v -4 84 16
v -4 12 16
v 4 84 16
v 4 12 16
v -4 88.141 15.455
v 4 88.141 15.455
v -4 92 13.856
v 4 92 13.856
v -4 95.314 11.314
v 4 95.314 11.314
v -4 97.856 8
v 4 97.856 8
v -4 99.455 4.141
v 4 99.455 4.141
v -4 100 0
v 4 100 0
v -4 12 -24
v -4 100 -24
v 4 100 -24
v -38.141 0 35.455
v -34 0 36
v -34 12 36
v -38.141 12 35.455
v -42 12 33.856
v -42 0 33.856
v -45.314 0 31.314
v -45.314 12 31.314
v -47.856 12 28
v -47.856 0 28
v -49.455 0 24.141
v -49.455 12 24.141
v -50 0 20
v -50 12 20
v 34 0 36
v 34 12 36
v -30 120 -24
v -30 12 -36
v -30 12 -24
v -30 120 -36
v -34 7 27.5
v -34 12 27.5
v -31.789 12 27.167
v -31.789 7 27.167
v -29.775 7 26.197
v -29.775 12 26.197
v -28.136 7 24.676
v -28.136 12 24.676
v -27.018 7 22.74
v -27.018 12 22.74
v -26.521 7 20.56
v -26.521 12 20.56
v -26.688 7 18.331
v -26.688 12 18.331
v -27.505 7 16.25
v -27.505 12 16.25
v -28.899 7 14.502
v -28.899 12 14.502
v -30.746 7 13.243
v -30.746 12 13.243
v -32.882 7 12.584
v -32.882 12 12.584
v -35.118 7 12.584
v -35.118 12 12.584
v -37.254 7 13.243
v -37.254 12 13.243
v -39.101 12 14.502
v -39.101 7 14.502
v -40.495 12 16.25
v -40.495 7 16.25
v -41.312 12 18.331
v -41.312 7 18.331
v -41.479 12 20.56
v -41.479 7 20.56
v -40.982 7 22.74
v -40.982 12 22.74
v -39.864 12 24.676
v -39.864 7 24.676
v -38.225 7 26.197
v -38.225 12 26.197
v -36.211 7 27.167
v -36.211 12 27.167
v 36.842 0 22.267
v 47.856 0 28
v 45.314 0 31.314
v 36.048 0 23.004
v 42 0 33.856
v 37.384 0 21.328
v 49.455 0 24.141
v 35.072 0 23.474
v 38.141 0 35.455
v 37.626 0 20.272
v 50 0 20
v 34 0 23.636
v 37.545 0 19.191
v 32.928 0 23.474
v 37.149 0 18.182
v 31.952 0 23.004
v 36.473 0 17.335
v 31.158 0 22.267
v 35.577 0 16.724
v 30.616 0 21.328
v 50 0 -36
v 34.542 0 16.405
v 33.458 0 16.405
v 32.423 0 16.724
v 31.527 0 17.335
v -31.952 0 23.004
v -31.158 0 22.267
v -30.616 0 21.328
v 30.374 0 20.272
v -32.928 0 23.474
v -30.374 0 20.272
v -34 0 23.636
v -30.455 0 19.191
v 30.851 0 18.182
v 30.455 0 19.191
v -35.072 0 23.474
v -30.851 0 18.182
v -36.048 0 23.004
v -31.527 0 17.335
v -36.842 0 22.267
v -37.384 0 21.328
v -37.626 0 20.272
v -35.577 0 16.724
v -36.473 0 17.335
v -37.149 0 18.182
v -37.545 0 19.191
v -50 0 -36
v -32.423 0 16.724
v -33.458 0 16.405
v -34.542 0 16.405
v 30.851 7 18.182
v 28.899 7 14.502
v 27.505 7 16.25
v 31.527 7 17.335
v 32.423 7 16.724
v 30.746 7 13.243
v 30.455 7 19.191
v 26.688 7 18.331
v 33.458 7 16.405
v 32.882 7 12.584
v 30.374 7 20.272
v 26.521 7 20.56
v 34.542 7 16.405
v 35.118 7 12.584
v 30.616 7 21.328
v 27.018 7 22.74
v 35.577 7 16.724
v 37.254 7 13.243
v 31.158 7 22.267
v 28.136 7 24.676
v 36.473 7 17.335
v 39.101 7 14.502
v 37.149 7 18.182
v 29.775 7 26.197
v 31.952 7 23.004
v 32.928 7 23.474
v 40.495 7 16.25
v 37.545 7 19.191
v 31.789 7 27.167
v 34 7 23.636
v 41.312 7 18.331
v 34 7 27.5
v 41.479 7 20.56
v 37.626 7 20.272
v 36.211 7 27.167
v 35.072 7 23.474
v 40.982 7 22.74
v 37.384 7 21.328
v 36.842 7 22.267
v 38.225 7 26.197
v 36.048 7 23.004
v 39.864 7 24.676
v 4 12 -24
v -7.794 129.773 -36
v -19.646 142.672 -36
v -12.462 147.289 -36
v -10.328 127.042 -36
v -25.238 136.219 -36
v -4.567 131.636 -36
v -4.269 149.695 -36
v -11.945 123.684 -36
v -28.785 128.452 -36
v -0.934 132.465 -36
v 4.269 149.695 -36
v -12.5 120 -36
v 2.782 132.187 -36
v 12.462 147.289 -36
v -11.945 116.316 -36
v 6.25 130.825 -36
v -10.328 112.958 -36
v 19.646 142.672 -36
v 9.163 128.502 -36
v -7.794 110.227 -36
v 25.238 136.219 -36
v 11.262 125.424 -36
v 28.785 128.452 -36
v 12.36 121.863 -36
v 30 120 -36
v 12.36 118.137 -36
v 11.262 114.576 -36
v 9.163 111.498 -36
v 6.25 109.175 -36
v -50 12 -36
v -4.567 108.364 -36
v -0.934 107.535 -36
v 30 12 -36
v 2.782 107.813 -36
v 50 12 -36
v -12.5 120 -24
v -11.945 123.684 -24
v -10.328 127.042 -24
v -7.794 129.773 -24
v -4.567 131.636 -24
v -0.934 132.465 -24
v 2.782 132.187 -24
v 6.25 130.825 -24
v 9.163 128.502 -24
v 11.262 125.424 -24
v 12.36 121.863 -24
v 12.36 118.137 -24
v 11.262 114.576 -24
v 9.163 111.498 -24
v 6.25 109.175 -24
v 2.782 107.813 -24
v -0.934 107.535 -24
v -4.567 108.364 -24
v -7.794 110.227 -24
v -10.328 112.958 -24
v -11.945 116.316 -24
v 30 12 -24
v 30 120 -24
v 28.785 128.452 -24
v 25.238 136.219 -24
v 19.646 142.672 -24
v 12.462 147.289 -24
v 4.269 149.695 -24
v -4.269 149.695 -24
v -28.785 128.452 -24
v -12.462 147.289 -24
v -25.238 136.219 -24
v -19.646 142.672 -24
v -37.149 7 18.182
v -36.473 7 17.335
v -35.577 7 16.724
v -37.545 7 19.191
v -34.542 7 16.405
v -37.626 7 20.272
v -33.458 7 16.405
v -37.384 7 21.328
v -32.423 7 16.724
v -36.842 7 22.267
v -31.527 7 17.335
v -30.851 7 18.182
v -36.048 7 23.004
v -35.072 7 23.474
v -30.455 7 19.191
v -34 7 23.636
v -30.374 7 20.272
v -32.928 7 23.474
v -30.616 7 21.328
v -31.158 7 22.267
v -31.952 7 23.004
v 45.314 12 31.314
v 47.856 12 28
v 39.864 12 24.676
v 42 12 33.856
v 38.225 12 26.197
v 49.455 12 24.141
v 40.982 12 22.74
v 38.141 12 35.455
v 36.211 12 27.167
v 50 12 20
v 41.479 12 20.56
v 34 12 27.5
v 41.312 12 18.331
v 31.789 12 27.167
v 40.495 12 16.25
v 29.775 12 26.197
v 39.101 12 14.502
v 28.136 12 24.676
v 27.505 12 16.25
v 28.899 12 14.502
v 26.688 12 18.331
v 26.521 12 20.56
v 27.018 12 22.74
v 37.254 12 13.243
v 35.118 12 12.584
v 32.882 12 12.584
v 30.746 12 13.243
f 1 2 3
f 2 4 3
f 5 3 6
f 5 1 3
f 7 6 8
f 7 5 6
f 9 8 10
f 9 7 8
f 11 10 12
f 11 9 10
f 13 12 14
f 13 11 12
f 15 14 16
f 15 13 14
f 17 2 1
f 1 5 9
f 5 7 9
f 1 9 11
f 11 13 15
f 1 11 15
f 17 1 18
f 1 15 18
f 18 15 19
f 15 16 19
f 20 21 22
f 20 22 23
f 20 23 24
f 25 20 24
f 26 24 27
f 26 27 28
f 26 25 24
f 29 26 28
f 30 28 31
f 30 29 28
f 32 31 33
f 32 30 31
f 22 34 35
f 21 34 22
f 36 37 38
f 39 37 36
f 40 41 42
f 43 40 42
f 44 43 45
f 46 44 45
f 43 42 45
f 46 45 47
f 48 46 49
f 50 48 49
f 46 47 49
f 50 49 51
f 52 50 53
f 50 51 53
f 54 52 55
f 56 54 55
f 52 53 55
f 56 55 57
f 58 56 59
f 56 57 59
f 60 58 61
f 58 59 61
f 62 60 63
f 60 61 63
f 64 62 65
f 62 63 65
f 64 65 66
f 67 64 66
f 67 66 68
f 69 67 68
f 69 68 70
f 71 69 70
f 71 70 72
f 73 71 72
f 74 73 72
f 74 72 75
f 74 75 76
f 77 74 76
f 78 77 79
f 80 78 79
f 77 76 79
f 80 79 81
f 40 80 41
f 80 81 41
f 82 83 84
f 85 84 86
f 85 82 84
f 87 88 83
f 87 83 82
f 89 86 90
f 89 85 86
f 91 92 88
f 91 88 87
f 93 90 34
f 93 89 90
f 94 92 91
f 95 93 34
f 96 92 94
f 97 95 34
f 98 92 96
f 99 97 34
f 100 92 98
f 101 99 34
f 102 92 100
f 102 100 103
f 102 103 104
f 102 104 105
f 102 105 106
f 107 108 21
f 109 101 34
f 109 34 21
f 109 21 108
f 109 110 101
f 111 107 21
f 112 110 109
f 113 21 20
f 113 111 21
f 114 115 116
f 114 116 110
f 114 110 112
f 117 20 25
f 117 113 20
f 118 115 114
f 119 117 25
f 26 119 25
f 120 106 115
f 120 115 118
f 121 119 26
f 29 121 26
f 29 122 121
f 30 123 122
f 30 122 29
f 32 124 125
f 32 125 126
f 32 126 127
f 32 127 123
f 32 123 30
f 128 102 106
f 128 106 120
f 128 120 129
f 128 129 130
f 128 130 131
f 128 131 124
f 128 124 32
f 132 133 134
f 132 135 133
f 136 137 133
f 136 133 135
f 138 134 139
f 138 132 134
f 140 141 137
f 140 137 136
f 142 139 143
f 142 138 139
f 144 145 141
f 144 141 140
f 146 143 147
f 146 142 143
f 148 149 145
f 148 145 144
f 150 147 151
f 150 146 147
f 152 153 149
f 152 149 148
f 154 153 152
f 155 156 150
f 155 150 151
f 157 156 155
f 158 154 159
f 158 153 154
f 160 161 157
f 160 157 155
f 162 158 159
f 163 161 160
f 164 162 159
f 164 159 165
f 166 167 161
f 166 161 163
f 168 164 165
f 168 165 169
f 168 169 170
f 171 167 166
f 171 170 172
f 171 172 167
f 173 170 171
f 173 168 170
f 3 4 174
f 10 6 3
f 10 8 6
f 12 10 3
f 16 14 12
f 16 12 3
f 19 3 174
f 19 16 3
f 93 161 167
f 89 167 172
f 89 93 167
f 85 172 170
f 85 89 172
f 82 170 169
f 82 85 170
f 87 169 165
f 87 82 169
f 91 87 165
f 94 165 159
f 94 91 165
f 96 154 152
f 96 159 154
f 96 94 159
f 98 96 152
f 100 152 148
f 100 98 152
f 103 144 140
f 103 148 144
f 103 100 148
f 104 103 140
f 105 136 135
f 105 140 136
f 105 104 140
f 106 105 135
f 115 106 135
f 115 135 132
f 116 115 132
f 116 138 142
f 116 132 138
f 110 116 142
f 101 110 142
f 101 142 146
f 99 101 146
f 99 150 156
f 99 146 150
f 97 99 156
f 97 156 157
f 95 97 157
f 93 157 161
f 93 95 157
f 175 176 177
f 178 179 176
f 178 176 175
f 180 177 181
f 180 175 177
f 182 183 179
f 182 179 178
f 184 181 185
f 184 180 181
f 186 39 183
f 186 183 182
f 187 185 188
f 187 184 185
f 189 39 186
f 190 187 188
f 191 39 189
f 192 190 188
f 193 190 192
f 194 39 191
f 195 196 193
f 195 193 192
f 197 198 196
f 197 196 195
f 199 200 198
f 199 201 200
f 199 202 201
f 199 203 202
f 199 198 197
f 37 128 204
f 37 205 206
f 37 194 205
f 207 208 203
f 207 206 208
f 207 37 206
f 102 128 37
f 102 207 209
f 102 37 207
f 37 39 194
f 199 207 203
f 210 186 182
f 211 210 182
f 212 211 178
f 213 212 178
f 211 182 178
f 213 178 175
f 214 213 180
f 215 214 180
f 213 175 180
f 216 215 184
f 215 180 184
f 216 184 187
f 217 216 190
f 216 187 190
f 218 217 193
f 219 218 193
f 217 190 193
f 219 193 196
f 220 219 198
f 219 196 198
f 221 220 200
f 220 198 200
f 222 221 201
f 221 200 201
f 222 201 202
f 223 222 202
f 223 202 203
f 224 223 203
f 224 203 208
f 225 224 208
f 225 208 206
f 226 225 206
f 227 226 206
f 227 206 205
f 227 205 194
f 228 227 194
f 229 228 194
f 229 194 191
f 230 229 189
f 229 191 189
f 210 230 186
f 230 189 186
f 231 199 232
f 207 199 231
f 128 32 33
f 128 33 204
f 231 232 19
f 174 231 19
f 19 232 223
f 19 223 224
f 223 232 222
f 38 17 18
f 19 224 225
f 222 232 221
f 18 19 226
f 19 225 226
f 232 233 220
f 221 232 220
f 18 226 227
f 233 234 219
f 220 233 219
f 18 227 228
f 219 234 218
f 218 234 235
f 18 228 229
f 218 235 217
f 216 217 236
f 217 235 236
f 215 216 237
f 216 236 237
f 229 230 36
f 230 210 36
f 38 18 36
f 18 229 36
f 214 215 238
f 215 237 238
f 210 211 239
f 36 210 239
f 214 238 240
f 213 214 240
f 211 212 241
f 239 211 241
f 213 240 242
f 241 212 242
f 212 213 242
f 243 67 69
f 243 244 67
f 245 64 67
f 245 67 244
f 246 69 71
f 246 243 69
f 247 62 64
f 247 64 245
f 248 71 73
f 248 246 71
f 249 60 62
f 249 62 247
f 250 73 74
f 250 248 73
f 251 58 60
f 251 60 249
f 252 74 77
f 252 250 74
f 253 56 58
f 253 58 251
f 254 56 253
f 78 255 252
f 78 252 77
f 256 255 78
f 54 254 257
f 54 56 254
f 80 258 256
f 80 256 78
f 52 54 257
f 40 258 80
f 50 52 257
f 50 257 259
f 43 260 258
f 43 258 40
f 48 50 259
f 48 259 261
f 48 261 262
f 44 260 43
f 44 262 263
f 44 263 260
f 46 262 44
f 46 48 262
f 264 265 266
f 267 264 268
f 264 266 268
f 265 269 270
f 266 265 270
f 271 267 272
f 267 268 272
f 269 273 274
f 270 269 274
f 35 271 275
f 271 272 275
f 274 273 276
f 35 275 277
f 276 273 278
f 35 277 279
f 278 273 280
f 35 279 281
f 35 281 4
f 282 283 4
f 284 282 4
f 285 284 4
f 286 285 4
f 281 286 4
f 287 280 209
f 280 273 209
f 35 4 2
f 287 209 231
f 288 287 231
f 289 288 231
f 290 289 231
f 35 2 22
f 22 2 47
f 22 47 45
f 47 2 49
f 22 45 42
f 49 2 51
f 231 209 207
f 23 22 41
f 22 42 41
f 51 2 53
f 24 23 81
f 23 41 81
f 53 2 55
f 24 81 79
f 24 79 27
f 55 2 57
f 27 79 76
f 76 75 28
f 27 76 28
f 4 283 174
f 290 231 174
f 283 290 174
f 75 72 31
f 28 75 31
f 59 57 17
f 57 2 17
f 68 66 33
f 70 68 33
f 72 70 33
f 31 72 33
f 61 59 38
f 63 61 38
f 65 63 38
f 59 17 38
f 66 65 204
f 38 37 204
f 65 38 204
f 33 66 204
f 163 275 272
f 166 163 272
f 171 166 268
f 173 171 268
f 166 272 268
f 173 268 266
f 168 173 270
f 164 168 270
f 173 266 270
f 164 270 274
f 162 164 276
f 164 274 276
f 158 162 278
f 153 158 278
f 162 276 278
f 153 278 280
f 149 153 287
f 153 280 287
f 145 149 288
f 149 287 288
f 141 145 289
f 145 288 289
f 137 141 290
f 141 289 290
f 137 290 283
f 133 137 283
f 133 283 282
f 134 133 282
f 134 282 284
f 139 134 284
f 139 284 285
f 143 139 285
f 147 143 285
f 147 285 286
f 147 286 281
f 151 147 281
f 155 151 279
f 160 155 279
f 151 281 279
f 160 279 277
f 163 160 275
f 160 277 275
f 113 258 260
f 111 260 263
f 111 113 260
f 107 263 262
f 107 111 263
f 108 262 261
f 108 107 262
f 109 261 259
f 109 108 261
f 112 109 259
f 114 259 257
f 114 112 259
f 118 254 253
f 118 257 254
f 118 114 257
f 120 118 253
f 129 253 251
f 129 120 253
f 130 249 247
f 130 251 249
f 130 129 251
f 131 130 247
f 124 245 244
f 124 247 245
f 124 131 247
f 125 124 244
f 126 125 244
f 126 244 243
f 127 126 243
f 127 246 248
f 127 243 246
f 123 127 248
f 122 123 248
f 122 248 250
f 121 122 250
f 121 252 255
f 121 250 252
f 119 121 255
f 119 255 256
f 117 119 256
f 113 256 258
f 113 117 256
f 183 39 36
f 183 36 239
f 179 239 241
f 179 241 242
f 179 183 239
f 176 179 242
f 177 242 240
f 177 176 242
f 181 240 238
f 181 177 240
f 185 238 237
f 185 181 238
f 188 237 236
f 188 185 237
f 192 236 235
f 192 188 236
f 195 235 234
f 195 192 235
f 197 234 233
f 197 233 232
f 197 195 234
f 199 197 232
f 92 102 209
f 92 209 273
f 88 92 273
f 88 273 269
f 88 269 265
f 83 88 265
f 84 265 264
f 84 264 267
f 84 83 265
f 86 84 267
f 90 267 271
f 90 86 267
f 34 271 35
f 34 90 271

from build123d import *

# Parameters (mm, degrees)
EXTRUDE_1_DEPTH     = 12
SKETCH_1_3_R        = 3.63567385
CUT_EXTRUDE_1_DEPTH = 12
SKETCH_2_R          = 7.5
CUT_EXTRUDE_2_DEPTH = 5
SKETCH_4_R          = 12.5
EXTRUDE_2_DEPTH     = 12
SKETCH_5_W          = 40
SKETCH_5_H          = 88
EXTRUDE_3_DEPTH     = 4
FILLET_1_R          = 16


with BuildPart() as part:
    # 草图1 → 凸台-拉伸1 (new body)
    with BuildSketch(Plane(origin=(0, 0, 0), x_dir=(1, 0, 0), z_dir=(0, 1, 0))):
        with BuildLine():
            Line((-50, 36), (50, 36))
            Line((50, 36), (50, -20))
            ThreePointArc((50, -20), (45.313708499, -31.313708499), (34, -36))
            Line((34, -36), (-34, -36))
            ThreePointArc((-34, -36), (-45.313708499, -31.313708499), (-50, -20))
            Line((-50, -20), (-50, 36))
        make_face()
    extrude(amount=EXTRUDE_1_DEPTH)

    # 草图1<3> → 切除-拉伸1 (cut)
    with BuildSketch(Plane(origin=(0, 0, 0), x_dir=(1, 0, 0), z_dir=(0, 1, 0))):
        with Locations((-34, -20)):
            Circle(SKETCH_1_3_R)
        with Locations((34, -20)):
            Circle(SKETCH_1_3_R)
    extrude(amount=CUT_EXTRUDE_1_DEPTH, mode=Mode.SUBTRACT)

    # 草图2 → 切除-拉伸2 (cut)
    with BuildSketch(Plane(origin=(0, 12, 0), x_dir=(1, 0, 0), z_dir=(0, 1, 0))):
        with Locations((34, -20)):
            Circle(SKETCH_2_R)
        with Locations((-34, -20)):
            Circle(SKETCH_2_R)
    extrude(amount=-CUT_EXTRUDE_2_DEPTH, mode=Mode.SUBTRACT)

    # 草图4 → 凸台-拉伸2 (add)
    with BuildSketch(Plane(origin=(0, 0, -36), x_dir=(-1, 0, 0), z_dir=(0, 0, -1))):
        with BuildLine():
            Line((-30, 12), (30, 12))
            Line((30, 12), (30, 120))
            ThreePointArc((30, 120), (0, 150), (-30, 120))
            Line((-30, 120), (-30, 12))
        make_face()
        with Locations((0, 120)):
            Circle(SKETCH_4_R, mode=Mode.SUBTRACT)
    extrude(amount=-EXTRUDE_2_DEPTH)

    # 草图5 → 凸台-拉伸3 (add, symmetric)
    with BuildSketch(Plane(origin=(0, 0, 0), x_dir=(0, 0, -1), z_dir=(1, 0, 0))):
        with Locations((4, 56)):
            Rectangle(SKETCH_5_W, SKETCH_5_H)
    extrude(amount=EXTRUDE_3_DEPTH, both=True)

    # 圆角1
    fillet_1_edges = [part.edges().sort_by_distance(p)[0] for p in [
        (0, 100, 16),
    ]]
    fillet(fillet_1_edges, radius=FILLET_1_R)


solid = part.part
